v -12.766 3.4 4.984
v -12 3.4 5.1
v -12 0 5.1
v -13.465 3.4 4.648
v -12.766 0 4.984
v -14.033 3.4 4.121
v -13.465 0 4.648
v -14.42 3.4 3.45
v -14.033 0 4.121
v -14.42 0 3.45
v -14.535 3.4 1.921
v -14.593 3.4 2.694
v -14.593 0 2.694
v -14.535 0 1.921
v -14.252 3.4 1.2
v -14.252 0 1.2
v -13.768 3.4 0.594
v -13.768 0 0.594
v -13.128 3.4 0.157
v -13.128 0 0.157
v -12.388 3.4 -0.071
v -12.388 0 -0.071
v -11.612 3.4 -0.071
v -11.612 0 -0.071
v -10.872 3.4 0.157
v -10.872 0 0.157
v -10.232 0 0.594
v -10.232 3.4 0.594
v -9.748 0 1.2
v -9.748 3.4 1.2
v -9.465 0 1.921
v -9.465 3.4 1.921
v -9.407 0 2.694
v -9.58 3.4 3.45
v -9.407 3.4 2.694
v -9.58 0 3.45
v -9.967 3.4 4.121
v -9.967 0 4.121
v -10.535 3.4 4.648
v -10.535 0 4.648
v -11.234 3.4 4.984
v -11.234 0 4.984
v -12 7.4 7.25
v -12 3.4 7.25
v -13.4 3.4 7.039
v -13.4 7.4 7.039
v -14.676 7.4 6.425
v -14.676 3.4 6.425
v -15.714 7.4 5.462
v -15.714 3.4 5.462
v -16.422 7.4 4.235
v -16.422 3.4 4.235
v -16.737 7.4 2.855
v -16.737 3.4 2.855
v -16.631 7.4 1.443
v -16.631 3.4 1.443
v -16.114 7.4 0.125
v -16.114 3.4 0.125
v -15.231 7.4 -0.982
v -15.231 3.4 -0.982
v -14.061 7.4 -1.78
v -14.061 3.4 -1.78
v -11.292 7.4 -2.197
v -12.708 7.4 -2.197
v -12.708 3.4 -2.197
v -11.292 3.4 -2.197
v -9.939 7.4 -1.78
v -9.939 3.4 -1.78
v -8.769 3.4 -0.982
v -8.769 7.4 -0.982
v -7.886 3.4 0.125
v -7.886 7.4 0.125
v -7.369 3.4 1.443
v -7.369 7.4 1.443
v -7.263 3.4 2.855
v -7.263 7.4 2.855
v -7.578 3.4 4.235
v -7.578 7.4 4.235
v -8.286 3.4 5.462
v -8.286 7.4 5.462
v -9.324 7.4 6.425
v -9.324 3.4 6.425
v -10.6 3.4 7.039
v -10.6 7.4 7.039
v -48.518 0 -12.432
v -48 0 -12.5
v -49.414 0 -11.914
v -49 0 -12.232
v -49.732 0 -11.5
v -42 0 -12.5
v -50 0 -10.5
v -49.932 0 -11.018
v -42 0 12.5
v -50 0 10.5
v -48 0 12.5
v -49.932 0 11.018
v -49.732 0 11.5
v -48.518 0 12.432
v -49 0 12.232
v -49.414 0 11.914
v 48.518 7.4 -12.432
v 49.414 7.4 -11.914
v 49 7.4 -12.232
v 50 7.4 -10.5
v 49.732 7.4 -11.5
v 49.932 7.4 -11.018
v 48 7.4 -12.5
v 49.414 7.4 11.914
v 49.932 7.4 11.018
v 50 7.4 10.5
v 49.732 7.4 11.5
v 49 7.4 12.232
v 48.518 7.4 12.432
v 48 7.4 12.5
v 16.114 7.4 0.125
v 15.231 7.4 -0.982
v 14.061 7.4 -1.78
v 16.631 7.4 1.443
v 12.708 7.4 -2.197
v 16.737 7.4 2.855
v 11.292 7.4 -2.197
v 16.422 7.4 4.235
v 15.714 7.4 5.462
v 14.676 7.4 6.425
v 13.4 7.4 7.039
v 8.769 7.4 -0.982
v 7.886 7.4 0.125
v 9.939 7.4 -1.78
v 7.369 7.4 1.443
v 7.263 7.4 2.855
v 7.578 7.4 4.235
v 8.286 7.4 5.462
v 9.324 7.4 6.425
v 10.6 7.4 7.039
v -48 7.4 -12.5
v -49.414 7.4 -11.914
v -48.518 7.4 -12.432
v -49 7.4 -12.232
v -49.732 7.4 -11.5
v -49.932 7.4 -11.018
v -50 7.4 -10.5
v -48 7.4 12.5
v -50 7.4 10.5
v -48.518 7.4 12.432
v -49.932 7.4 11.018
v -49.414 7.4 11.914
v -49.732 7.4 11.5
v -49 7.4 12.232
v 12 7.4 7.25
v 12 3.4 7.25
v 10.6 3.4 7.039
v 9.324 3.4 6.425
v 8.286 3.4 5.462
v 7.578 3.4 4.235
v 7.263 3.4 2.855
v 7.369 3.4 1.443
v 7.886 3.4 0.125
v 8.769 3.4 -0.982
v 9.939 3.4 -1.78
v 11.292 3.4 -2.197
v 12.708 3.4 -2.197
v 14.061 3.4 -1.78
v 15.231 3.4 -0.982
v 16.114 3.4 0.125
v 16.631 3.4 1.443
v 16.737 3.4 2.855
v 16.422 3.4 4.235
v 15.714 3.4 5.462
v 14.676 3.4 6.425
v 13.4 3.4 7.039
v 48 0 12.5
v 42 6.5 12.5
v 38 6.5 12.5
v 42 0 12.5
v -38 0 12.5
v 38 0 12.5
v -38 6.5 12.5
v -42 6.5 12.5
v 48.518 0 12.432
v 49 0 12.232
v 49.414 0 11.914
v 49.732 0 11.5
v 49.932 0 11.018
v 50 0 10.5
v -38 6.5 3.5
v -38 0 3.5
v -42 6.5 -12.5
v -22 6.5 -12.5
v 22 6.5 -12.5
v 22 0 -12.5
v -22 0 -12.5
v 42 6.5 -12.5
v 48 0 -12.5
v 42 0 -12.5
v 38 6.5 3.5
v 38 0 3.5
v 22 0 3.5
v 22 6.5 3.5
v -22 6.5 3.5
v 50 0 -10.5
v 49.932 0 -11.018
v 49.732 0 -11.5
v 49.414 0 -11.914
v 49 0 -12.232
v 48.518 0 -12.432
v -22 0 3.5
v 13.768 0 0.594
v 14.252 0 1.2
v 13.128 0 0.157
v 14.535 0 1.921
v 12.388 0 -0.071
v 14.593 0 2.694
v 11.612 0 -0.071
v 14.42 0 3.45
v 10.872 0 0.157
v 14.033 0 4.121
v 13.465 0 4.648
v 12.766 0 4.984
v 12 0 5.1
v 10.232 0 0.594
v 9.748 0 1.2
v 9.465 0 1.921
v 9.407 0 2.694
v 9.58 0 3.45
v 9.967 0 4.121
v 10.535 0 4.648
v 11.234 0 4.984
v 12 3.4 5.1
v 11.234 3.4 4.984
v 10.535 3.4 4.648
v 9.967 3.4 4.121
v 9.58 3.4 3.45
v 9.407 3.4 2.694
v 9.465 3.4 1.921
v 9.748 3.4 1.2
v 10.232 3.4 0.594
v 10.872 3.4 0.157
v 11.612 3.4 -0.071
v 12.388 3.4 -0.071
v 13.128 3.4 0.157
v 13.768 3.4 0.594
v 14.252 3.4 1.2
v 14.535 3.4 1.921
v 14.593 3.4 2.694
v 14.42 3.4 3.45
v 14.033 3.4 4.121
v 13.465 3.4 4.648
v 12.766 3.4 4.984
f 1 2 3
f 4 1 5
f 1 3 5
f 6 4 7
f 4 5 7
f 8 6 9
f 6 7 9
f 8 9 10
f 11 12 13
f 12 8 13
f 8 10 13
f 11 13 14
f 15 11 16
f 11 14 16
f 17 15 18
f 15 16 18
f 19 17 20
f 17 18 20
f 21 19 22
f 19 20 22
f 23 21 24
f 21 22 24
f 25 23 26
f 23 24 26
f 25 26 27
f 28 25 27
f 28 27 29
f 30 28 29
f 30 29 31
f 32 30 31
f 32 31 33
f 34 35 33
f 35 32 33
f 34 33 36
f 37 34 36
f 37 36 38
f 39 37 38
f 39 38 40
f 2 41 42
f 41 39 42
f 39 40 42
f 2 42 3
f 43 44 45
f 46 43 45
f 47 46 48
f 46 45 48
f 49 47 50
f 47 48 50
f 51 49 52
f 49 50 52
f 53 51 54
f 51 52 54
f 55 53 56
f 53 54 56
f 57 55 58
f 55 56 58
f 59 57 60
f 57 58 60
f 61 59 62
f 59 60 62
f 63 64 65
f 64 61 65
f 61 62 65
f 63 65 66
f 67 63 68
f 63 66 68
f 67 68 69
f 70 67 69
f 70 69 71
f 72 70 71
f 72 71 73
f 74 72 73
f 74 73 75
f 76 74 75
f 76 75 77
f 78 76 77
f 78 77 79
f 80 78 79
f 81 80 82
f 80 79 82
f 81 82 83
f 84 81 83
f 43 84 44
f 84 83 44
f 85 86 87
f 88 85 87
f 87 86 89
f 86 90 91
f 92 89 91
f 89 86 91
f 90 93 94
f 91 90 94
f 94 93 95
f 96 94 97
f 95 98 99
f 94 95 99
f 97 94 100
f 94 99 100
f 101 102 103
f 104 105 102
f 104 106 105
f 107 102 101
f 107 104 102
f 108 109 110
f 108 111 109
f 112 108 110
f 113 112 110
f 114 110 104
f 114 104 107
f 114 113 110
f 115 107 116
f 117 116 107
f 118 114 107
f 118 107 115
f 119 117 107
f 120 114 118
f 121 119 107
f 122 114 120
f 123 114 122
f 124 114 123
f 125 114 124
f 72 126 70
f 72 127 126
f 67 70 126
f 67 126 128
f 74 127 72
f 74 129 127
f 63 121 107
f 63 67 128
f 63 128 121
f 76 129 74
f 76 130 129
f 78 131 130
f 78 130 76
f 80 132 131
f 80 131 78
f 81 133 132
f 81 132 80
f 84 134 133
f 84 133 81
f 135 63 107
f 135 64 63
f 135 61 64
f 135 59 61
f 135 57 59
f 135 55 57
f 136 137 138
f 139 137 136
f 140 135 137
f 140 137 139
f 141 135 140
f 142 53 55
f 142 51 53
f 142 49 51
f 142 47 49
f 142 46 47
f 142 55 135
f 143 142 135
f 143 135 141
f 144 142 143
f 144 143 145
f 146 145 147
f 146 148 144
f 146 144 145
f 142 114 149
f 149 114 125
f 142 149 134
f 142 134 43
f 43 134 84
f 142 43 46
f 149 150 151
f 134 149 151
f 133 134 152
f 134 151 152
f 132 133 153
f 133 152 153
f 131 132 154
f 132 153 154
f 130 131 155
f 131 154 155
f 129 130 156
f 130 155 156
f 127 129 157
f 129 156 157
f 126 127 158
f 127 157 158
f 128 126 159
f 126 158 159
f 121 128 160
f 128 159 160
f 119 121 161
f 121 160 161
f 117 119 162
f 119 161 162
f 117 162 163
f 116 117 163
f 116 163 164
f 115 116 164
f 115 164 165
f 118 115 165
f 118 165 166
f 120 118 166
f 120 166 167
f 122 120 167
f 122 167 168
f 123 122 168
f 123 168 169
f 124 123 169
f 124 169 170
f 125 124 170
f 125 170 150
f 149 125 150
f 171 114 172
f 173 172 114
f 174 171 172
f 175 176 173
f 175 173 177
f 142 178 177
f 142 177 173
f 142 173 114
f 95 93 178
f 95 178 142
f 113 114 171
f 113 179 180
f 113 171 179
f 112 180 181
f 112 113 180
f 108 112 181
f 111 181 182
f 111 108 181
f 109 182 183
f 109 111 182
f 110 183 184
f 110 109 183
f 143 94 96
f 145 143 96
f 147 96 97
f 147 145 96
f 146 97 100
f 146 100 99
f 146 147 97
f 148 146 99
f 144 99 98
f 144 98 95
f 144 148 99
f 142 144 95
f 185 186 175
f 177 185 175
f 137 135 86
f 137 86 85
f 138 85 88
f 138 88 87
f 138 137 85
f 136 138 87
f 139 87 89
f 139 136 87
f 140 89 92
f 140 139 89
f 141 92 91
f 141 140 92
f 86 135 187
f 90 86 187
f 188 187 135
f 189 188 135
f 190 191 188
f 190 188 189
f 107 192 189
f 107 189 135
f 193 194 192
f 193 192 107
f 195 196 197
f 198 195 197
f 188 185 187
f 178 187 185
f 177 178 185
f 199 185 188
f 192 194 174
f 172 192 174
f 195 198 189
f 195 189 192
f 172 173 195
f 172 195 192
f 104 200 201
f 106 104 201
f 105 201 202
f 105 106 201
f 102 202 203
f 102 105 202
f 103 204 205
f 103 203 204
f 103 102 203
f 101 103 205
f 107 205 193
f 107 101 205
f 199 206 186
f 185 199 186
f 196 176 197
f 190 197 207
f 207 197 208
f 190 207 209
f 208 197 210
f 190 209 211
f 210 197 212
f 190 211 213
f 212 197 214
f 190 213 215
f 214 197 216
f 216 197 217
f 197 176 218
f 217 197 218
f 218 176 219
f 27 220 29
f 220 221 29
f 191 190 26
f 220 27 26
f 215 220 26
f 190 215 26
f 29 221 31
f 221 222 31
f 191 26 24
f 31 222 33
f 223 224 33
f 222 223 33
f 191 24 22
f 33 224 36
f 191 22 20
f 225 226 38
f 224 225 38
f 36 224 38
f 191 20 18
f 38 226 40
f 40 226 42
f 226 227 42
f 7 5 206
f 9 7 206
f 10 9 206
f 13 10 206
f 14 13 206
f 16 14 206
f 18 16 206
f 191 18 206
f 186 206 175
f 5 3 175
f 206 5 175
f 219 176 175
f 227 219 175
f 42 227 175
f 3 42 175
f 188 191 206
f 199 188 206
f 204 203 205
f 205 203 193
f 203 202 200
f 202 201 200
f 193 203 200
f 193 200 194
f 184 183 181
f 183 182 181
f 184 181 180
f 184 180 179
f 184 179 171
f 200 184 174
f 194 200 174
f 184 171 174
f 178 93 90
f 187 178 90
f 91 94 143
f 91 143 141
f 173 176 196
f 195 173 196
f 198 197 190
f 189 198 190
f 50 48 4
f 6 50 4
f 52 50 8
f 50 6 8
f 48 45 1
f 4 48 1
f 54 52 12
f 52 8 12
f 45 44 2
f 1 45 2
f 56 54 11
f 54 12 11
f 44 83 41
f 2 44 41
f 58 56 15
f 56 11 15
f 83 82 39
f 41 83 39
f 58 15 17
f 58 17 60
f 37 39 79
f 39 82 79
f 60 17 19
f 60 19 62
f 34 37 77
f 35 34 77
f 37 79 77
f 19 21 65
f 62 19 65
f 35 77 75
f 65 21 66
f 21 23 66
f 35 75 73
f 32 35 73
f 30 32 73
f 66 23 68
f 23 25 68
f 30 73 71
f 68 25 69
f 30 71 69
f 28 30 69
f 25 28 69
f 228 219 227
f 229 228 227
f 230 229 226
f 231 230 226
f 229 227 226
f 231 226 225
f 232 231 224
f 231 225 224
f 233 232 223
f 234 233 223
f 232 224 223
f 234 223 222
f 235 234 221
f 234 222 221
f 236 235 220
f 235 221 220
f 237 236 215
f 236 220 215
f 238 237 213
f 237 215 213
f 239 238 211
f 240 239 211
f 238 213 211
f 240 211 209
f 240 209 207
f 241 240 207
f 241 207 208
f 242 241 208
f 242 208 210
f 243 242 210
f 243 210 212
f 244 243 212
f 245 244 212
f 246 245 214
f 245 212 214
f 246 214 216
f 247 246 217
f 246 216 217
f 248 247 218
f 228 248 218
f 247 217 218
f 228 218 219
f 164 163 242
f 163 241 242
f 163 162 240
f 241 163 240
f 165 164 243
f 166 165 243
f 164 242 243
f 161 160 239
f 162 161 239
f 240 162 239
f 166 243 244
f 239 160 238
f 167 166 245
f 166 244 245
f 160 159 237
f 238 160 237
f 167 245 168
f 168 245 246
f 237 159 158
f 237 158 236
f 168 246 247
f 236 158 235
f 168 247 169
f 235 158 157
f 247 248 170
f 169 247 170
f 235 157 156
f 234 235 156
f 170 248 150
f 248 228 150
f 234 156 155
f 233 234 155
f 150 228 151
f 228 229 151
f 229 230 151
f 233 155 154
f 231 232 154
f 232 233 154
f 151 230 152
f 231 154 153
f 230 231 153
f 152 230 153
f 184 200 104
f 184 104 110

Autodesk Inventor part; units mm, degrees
ref_plane "YZ Plane" through (0, 0, 0) normal (1, 0, 0) x (0, 1, 0)
ref_plane "XZ Plane" through (0, 0, 0) normal (0, 1, 0) x (-1, 0, 0)
ref_plane "XY Plane" through (0, 0, 0) normal (0, 0, 1) x (1, 0, 0)
sketch "Sketch1" plane through (0, 0, 0) normal (0, 1, 0) x (-1, 0, 0)
  line L0 (50, -12.5) -> (-50, -12.5)
  line L1 (-50, -12.5) -> (-50, 12.5)
  line L2 (-50, 12.5) -> (50, 12.5)
  line L3 (50, 12.5) -> (50, -12.5)
  line L4 (50, -12.5) -> (-50, 12.5) construction
  line L5 (-50, -12.5) -> (50, 12.5) construction
  point P0 (0, 0)
  dimension "d0" = 100
  dimension "d1" = 25
extrude "Extrusion1" add sketch "Sketch1" along normal blind 7.4
sketch "Sketch2" plane through (0, 7.4, 0) normal (0, 1, 0) x (1, 0, 0)
  line L0 (-32.5, 12.8309) -> (-37.5, 12.8309) projected
  line L1 (-37.5, 12.8309) -> (-37.5, 27.8309) projected
  line L2 (-37.5, 27.8309) -> (-32.5, 27.8309) projected
  line L3 (-32.5, 27.8309) -> (-32.5, 12.8309) projected
  line L4 (32.5, 12.8309) -> (37.5, 12.8309) projected
  line L5 (32.5, 27.8309) -> (32.5, 12.8309) projected
  line L6 (37.5, 27.8309) -> (32.5, 27.8309) projected
  line L7 (37.5, 12.8309) -> (37.5, 27.8309) projected
  line L8 (-50, -12.5) -> (50, -12.5) projected
  line L9 (50, -12.5) -> (50, 12.5) projected
  line L10 (50, 12.5) -> (-50, 12.5) projected
  line L11 (-50, 12.5) -> (-50, -12.5) projected
  line L12 (-42, 12.5) -> (-22, 12.5)
  line L13 (-22, 12.5) -> (-22, -3.5)
  line L14 (-22, -3.5) -> (-42, -3.5)
  line L15 (-42, -3.5) -> (-42, 12.5)
  line L16 (-42, -3.5) -> (-42, -12.5)
  line L17 (-38, -3.5) -> (-38, -12.5)
  point P0 (0, 0)
  point P1 (-35, 12.8309)
  point P2 (-22, 12.5)
  dimension "d4" = 7
  dimension "d5" = 20
  dimension "d6" = 16
  dimension "d7" = 4
sketch "Sketch3" plane through (0, 7.4, 0) normal (0, 1, 0) x (1, 0, 0)
  line L0 (50, 12.5) -> (-50, 12.5) projected
  line L1 (-50, -12.5) -> (50, -12.5) projected
  line L2 (50, -12.5) -> (50, 12.5) projected
  line L3 (-50, 12.5) -> (-50, -12.5) projected
  point P0 (0, 0)
  point P1 (12, -2.5)
  dimension "d11" = 12
  dimension "d12" = 15
hole "Hole1" at (12, 7.4, 2.5) direction (0, -1, 0) diameter 5.2 end through all counterbore diameter 9.5 counterbore depth 4
fillet "Fillet1" radius 2 4 edges at (50, 3.7, 12.5) (50, 3.7, -12.5) (-50, 3.7, 12.5) (-50, 3.7, -12.5)
sketch "Sketch4" plane through (0, 0, 0) normal (0, -1, 0) x (1, 0, 0)
  line L0 (-22, -12.5) -> (-22, 3.5) projected
  line L1 (-22, 3.5) -> (-42, 3.5) projected
  line L2 (48, -12.5) -> (-48, -12.5) projected
  line L3 (-42, 3.5) -> (-42, -12.5) projected
  line L4 (-42, 3.5) -> (-42, 12.5) projected
  line L5 (-38, 3.5) -> (-38, 12.5) projected
  line L6 (-48, 12.5) -> (48, 12.5) projected
  point P0 (0, 0)
extrude "Extrusion3" cut sketch "Sketch4" against normal blind 6.5
mirror "Mirror2" about plane through (0, 0, 0) normal (1, 0, 0) of "Hole1", "Extrusion3"
properties part number "Limit Switch Bracket" material "ABS Plastic"
